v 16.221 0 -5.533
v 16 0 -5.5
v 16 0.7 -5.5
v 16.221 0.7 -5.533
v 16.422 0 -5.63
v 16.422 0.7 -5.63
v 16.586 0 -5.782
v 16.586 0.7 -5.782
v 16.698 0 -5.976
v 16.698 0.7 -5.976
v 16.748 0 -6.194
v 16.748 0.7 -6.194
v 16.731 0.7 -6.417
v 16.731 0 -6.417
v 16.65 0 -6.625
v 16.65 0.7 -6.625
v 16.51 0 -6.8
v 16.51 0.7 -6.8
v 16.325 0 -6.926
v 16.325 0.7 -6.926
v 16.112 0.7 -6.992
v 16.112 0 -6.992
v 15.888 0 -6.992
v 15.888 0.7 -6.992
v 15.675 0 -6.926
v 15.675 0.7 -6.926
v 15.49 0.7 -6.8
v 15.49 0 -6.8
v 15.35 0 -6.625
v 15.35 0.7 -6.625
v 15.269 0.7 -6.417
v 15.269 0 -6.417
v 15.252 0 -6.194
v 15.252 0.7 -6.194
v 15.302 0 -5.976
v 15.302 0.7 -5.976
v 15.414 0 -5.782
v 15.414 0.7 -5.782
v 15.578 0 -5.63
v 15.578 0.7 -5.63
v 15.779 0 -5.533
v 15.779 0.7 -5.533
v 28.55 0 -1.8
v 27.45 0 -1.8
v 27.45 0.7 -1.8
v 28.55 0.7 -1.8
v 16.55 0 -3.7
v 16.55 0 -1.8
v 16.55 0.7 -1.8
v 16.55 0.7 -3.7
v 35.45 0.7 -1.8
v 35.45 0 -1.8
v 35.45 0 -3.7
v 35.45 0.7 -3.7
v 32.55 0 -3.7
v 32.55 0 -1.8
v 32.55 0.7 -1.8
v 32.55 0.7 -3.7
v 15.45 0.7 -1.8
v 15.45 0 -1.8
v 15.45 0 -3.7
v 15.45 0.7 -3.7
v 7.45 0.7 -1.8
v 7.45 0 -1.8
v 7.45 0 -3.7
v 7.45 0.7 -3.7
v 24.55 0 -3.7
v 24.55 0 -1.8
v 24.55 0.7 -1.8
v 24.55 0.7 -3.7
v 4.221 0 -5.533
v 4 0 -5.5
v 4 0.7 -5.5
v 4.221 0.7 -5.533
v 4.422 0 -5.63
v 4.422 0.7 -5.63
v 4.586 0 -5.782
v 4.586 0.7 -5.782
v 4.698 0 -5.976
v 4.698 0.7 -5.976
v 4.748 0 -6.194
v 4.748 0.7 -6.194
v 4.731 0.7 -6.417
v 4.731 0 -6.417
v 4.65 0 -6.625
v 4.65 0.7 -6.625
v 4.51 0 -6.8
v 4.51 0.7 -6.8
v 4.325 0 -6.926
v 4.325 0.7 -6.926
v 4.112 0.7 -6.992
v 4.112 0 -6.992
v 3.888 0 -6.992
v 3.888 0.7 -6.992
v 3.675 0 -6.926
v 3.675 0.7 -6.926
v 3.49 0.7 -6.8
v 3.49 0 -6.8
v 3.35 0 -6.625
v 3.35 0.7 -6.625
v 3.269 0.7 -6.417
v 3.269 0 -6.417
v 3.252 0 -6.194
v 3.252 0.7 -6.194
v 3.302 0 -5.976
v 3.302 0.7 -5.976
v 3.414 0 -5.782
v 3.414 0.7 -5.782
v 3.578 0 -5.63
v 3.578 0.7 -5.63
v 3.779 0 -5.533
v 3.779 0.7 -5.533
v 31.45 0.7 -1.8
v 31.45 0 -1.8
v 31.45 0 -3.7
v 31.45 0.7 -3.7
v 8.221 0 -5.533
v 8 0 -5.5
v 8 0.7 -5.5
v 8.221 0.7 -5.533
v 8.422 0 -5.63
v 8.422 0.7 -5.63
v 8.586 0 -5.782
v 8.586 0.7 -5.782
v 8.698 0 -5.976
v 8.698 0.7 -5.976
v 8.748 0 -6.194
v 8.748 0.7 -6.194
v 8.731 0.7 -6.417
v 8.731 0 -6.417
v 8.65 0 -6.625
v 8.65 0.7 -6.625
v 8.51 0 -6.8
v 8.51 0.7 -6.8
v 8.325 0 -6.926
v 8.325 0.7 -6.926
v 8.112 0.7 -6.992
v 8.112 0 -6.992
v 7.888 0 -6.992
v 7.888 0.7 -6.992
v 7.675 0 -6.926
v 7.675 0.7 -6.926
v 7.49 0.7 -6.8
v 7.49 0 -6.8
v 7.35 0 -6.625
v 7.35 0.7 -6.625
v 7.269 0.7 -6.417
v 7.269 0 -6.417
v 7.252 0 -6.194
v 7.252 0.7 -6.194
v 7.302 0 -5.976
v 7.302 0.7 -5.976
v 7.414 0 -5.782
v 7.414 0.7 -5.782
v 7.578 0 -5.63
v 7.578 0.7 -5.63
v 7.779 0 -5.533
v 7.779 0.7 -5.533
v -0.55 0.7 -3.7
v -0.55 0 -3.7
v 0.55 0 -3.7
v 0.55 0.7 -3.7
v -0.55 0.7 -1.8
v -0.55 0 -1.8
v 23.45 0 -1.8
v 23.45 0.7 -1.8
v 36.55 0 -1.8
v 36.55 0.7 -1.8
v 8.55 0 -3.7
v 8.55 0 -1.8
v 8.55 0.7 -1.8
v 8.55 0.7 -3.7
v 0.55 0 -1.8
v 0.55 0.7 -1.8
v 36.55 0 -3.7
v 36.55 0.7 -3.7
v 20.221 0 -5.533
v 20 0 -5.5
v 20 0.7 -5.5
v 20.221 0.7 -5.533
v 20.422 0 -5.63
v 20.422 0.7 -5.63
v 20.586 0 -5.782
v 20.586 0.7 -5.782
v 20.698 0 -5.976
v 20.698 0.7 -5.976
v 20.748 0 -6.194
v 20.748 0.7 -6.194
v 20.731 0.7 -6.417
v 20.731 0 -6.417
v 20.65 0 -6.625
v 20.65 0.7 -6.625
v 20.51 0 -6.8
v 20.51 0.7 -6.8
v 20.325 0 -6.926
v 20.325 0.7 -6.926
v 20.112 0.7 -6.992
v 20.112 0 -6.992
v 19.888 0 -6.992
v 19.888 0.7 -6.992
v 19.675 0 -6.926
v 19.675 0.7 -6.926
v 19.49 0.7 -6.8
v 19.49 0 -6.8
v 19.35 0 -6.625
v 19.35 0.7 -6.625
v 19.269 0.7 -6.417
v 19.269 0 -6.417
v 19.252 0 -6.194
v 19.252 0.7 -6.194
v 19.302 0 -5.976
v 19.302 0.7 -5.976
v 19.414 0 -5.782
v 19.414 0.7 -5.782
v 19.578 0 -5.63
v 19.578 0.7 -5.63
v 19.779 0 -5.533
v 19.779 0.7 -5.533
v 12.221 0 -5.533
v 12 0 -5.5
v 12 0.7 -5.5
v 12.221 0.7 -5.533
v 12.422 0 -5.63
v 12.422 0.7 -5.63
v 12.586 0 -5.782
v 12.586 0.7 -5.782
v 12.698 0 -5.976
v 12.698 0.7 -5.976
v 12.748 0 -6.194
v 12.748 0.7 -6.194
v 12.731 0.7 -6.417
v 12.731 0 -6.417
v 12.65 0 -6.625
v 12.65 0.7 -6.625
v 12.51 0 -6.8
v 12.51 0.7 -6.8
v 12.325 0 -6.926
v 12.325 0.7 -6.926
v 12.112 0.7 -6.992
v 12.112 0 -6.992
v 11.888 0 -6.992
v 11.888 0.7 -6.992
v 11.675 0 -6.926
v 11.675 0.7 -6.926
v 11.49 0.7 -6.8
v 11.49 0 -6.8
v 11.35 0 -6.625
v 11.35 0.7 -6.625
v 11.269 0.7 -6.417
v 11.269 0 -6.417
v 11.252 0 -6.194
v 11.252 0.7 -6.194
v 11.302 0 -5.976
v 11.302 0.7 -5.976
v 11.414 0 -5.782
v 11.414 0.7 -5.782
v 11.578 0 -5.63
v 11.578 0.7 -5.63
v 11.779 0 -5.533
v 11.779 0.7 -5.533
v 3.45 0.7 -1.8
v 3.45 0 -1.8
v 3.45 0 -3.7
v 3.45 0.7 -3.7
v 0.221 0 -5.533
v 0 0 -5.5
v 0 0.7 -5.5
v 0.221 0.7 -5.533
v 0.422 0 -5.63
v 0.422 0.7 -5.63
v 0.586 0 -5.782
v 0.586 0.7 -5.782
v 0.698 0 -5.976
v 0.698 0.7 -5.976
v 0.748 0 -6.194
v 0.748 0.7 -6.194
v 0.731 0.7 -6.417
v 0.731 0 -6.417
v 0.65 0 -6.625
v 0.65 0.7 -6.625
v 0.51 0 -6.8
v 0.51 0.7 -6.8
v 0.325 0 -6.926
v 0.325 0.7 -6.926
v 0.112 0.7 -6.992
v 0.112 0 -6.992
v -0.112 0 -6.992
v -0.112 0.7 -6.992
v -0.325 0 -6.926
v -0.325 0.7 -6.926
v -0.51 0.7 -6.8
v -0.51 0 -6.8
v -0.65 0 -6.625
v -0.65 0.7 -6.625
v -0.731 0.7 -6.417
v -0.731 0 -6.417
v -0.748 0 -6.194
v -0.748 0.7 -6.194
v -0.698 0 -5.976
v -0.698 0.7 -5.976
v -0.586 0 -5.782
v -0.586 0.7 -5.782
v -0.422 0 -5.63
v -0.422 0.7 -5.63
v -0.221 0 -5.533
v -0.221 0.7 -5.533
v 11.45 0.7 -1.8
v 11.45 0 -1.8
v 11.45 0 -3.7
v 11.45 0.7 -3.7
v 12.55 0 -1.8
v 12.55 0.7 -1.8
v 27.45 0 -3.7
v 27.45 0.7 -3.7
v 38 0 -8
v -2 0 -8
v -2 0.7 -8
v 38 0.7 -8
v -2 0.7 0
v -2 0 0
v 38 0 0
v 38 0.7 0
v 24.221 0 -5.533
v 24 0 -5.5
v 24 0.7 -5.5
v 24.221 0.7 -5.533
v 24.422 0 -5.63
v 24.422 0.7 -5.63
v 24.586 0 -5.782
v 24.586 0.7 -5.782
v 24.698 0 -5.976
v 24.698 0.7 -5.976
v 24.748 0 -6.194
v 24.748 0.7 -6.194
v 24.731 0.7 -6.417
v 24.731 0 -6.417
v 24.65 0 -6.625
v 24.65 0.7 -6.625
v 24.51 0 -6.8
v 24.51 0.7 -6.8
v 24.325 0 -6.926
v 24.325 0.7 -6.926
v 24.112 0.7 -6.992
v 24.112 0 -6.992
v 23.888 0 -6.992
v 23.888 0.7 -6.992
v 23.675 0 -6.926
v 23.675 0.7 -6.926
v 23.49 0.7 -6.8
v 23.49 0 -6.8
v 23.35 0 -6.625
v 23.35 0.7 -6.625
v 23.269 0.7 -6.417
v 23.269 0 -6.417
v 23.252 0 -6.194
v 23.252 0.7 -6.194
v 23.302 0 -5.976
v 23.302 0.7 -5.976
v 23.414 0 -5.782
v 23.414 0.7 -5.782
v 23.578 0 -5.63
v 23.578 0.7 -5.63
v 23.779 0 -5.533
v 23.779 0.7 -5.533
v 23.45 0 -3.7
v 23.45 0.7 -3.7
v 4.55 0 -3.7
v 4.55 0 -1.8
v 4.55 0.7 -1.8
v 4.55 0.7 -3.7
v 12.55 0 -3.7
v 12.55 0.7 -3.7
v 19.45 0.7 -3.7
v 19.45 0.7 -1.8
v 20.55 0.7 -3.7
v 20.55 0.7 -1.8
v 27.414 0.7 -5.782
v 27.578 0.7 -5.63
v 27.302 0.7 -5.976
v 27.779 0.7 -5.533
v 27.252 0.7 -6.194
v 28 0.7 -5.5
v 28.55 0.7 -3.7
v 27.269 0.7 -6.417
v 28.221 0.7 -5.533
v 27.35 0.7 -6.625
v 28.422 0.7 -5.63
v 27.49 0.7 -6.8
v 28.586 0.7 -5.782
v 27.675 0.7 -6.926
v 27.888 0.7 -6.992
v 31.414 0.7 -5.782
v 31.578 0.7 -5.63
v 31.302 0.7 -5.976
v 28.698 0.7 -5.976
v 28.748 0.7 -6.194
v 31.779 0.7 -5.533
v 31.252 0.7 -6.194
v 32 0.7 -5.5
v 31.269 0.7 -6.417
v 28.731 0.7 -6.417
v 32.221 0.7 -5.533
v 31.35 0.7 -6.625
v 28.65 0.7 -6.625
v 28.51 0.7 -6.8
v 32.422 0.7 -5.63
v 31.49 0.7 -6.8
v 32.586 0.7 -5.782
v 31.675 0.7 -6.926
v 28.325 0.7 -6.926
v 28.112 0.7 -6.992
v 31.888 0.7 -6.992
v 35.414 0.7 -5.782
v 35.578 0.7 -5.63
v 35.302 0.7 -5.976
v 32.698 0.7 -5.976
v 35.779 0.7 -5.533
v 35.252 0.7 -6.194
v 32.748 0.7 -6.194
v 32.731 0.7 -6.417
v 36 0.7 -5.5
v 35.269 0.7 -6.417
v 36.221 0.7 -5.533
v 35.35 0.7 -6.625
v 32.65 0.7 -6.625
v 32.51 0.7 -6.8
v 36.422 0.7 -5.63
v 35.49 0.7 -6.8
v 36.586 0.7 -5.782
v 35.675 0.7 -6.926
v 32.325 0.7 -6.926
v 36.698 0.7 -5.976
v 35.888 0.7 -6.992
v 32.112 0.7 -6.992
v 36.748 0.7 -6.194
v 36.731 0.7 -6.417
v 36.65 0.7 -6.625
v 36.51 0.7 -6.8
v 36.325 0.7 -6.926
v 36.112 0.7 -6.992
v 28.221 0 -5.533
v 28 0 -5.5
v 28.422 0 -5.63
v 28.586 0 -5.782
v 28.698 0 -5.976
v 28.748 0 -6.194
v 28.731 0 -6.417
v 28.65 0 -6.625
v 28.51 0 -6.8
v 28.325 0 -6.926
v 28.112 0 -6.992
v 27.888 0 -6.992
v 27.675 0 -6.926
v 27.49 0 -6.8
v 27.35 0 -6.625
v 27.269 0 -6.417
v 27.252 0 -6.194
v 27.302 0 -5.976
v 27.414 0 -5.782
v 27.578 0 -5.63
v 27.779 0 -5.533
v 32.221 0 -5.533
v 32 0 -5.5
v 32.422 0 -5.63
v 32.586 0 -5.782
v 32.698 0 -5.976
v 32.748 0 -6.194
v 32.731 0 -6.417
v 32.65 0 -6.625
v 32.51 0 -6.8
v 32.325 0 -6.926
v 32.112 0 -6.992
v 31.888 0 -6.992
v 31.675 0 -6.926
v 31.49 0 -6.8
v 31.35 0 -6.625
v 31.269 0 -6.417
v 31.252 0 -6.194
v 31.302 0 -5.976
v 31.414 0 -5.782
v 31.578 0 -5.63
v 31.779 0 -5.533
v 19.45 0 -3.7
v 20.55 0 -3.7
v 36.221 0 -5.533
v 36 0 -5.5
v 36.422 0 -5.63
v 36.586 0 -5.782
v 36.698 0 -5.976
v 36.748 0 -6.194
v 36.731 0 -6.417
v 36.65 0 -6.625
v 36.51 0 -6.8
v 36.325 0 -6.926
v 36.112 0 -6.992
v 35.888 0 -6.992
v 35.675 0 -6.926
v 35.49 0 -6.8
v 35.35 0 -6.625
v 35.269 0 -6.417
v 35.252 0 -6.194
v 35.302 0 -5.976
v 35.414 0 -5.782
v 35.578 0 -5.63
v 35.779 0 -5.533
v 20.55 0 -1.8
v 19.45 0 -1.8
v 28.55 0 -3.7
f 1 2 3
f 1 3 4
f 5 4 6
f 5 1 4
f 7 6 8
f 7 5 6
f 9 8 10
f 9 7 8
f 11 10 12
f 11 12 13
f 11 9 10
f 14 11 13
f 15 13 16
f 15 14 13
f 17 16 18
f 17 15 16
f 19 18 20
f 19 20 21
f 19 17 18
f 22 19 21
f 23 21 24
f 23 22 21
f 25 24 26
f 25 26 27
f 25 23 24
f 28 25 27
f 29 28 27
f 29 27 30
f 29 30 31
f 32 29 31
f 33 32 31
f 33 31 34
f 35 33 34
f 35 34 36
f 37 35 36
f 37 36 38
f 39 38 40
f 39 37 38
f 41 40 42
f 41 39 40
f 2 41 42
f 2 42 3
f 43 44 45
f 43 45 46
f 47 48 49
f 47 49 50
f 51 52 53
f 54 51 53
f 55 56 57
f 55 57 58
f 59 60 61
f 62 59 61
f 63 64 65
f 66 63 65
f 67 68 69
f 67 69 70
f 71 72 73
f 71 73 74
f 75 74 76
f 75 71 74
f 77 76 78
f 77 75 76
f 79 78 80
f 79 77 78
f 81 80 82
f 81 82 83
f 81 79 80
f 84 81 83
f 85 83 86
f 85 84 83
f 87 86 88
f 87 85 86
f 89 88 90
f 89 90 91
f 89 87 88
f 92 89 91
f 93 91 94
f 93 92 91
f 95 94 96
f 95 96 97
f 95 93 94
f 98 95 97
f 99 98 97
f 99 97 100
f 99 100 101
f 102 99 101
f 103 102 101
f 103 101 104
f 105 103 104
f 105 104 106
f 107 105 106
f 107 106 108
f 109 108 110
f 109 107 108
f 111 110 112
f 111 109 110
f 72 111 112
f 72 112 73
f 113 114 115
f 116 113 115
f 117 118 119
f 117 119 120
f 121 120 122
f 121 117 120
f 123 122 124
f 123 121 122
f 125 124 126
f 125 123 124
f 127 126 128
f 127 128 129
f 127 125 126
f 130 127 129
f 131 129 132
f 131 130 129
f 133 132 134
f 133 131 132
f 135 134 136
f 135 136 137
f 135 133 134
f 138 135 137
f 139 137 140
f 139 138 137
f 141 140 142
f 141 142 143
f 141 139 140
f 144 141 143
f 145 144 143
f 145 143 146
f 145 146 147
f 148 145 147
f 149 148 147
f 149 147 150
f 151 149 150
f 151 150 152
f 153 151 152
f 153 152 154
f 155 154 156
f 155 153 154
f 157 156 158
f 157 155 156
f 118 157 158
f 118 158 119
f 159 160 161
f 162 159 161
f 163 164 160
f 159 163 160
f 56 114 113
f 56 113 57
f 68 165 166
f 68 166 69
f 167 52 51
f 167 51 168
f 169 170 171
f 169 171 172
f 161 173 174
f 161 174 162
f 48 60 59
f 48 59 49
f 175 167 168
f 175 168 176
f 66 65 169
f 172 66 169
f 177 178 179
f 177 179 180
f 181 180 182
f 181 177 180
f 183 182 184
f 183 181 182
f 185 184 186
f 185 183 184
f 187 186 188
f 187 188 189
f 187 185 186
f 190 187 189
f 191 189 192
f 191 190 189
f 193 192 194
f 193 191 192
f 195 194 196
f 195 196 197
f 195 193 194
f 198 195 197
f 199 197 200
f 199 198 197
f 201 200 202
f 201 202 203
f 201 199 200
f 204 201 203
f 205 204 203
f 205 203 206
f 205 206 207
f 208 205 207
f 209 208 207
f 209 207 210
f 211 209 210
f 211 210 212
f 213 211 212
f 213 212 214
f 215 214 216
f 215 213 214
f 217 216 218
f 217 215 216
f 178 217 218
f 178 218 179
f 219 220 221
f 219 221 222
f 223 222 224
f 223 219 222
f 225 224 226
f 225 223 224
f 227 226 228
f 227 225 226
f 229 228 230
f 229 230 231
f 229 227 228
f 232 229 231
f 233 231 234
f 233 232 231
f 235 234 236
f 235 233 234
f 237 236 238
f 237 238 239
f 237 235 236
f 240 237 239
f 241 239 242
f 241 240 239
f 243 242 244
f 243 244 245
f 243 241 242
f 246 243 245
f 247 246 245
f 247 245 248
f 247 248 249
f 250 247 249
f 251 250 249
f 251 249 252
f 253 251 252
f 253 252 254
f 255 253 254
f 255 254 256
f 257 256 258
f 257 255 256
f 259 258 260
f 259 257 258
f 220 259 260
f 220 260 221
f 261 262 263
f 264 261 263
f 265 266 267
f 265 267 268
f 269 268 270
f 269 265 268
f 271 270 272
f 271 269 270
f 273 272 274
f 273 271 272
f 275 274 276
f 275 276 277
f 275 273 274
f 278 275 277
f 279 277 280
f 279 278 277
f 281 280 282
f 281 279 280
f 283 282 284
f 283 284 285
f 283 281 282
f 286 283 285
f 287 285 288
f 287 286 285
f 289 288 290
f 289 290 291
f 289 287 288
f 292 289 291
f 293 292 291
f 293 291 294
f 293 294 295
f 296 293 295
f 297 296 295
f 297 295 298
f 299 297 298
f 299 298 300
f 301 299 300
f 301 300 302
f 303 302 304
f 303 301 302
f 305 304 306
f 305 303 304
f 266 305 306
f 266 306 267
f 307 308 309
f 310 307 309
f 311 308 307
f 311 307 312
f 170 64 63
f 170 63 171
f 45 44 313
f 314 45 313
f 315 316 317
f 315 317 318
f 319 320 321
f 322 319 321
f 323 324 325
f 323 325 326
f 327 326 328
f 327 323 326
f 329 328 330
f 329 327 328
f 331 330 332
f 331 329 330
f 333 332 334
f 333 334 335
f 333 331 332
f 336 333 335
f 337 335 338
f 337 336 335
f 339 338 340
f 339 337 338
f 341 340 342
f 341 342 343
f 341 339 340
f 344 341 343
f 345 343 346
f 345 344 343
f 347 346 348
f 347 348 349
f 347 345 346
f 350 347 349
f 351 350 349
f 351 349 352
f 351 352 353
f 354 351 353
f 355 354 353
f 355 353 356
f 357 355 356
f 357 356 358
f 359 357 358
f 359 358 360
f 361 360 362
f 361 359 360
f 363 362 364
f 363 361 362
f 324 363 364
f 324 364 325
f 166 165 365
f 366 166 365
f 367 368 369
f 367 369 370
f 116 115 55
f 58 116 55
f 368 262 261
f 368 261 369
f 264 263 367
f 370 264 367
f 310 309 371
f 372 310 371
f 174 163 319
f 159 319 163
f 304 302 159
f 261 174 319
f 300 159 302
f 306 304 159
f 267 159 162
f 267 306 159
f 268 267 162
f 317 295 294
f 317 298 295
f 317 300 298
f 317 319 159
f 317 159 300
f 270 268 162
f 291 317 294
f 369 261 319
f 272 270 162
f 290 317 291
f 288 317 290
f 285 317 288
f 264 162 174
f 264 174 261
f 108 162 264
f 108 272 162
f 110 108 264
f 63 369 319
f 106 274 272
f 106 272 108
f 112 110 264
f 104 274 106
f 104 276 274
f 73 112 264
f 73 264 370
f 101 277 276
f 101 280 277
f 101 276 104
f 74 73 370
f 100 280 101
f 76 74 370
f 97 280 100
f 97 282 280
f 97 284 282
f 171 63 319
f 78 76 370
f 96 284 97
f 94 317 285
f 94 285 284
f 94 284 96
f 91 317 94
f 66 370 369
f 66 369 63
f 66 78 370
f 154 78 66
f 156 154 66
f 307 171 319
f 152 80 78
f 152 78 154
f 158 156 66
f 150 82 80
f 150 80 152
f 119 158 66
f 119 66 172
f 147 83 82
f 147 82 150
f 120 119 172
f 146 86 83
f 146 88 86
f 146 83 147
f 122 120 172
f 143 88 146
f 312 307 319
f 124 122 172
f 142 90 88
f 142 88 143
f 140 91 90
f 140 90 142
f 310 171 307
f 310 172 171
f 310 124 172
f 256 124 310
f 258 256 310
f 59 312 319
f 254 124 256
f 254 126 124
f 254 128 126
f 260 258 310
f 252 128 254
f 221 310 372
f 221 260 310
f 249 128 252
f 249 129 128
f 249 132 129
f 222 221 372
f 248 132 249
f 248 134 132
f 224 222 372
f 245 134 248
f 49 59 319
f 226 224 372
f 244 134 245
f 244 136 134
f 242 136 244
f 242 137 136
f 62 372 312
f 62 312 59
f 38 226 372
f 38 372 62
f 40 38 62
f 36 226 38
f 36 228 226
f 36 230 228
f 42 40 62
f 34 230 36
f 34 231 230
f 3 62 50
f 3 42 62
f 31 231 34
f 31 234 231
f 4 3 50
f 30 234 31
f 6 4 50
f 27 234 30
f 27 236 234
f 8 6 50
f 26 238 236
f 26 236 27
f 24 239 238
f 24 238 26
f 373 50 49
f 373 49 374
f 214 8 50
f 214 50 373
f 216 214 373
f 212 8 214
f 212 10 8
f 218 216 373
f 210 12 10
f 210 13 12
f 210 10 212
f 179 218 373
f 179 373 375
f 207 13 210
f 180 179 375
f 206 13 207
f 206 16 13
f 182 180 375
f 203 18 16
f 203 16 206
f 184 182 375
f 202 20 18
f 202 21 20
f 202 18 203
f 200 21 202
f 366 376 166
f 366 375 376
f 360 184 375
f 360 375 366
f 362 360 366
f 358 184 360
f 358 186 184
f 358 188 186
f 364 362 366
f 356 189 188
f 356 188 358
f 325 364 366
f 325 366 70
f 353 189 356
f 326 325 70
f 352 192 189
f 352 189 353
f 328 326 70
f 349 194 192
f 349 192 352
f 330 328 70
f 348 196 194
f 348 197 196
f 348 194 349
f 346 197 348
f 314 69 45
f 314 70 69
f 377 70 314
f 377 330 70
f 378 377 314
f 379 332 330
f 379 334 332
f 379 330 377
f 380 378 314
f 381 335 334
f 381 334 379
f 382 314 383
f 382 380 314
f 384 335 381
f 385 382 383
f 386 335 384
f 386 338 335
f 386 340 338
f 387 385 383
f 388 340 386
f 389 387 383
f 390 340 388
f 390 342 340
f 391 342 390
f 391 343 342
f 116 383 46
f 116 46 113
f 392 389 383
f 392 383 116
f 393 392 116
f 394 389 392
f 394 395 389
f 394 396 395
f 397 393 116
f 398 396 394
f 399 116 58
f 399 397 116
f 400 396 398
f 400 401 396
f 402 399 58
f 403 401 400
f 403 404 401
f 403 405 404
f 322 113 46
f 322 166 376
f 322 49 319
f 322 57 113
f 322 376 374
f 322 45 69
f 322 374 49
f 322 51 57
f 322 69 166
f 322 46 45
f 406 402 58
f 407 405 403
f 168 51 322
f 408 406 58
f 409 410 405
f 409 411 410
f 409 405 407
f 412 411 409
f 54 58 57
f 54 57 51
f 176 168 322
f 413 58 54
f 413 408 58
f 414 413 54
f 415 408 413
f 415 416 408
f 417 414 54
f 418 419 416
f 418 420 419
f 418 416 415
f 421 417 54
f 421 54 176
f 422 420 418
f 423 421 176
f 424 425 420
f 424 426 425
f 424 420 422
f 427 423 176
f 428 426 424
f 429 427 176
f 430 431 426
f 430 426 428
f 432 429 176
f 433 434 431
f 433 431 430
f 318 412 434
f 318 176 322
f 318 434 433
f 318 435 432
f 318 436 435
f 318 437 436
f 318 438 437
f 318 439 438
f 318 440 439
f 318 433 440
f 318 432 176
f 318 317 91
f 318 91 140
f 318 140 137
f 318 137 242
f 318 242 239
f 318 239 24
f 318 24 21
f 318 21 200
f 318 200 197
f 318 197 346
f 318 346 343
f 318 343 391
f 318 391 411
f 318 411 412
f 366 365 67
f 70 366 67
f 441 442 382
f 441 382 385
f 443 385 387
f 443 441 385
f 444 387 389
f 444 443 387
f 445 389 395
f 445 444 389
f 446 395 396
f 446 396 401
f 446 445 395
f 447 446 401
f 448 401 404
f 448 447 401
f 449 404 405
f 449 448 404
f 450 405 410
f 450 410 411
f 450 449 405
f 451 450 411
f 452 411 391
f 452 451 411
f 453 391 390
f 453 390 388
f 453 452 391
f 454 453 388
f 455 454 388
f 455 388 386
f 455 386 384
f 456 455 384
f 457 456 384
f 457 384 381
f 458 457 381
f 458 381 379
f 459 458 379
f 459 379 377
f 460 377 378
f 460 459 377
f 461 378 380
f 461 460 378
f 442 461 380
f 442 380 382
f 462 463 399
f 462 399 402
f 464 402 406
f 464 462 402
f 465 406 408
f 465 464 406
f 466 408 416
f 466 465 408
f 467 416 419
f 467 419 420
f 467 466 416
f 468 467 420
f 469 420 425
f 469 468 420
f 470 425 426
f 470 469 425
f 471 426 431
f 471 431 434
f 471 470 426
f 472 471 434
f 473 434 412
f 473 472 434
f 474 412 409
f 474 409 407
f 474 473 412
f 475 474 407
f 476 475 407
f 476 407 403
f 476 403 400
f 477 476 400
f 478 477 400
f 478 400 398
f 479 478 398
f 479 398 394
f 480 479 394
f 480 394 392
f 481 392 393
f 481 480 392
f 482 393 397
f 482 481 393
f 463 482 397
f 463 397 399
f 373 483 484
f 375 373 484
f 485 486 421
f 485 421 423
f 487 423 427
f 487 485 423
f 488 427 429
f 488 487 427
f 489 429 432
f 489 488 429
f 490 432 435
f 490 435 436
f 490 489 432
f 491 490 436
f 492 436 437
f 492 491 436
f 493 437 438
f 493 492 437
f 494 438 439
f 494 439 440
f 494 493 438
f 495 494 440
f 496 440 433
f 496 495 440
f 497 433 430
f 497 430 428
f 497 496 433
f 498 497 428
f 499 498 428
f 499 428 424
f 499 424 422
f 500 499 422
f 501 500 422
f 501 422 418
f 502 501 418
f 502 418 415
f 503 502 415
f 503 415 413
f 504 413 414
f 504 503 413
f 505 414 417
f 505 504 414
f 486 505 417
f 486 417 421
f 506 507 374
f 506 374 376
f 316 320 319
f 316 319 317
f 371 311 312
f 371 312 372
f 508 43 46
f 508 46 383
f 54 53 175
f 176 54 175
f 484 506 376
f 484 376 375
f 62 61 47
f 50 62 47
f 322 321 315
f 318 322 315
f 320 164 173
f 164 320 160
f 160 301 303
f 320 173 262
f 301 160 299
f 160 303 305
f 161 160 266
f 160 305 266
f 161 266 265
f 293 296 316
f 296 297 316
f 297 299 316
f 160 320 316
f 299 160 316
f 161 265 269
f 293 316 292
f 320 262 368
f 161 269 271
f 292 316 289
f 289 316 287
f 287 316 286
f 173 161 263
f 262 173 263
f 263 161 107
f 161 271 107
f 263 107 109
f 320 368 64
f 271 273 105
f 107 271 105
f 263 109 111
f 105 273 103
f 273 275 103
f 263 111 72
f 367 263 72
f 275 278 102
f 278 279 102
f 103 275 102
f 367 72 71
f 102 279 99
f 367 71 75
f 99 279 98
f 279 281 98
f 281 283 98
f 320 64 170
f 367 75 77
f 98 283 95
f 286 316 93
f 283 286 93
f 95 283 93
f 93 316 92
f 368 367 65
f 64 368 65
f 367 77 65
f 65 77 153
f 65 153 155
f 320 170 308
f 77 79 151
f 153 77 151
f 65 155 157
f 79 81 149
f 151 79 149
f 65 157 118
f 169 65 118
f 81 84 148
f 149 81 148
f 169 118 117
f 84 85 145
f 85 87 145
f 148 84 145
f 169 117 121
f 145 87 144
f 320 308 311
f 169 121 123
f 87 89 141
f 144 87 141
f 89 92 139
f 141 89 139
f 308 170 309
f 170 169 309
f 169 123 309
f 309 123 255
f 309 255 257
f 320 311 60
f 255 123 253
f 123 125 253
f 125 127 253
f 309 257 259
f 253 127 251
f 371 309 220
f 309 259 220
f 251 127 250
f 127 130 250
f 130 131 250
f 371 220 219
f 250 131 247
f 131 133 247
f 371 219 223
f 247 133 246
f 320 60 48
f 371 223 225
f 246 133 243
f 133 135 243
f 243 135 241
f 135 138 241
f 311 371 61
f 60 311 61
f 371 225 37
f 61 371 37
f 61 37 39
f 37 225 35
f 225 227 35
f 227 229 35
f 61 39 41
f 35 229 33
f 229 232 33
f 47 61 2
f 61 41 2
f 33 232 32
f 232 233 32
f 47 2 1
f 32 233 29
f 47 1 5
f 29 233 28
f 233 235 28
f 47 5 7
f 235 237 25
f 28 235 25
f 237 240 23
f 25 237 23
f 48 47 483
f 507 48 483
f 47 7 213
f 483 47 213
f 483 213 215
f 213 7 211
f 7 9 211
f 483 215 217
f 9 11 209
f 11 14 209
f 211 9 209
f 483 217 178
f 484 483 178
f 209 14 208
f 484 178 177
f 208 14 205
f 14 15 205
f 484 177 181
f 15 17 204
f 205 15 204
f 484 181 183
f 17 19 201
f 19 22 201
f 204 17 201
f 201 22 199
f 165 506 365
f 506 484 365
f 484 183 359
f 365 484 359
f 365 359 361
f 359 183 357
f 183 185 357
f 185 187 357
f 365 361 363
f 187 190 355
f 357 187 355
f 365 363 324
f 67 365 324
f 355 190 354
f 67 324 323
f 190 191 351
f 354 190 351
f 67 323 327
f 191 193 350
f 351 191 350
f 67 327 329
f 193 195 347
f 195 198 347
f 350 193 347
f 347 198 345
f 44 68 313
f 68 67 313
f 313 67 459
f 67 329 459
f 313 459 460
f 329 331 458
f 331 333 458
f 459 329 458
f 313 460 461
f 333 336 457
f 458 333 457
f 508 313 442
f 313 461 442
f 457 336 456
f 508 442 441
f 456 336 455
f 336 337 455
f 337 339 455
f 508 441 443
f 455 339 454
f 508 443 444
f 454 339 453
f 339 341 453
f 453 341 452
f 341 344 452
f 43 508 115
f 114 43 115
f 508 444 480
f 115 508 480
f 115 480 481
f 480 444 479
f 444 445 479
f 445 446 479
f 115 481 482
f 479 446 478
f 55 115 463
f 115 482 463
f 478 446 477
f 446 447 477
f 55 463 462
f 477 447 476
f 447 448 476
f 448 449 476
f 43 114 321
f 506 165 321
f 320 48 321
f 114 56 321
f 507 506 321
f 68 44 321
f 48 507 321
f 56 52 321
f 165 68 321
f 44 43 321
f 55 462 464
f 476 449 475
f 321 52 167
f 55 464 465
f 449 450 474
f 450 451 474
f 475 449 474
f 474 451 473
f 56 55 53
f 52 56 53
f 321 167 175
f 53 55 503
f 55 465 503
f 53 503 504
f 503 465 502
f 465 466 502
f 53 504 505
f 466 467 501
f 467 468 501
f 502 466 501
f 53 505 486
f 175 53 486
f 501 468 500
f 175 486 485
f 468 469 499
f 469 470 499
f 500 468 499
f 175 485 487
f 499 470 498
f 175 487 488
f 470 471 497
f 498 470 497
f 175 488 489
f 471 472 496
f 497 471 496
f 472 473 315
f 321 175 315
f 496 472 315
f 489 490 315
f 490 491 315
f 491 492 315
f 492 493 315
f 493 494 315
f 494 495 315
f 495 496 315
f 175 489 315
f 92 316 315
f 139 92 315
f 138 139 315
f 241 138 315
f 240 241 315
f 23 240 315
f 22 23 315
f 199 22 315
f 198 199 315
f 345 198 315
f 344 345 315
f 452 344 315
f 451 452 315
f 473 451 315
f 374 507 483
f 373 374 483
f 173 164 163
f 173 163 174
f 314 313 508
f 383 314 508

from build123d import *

# Parameters (mm, degrees)
SKETCH_1_W             = 4
SKETCH_1_H             = 8
SKETCH_1_R             = 0.75
SKETCH_1_W_2           = 1.1
SKETCH_1_H_2           = 1.9
EXTRUDE_1_DEPTH        = 0.7
PATTERN_LINEAR_2_COUNT = 10
PATTERN_LINEAR_2_PITCH = 4


with BuildPart() as part:
    # 草图1 → 凸台-拉伸1 (new body)
    with BuildSketch(Plane(origin=(0, 0, 0), x_dir=(1, 0, 0), z_dir=(0, 1, 0))):
        with Locations((0, 4)):
            Rectangle(SKETCH_1_W, SKETCH_1_H)
        with Locations(Location((0, 6.25, 0), (0, 0, 270))):
            Circle(SKETCH_1_R, mode=Mode.SUBTRACT)
        with Locations((0, 2.75)):
            Rectangle(SKETCH_1_W_2, SKETCH_1_H_2, mode=Mode.SUBTRACT)
    extrude_1 = extrude(amount=EXTRUDE_1_DEPTH)

    # 阵列(线性)2: 凸台-拉伸1 ×10
    with Locations(*[(i * PATTERN_LINEAR_2_PITCH, 0, 0) for i in range(1, PATTERN_LINEAR_2_COUNT)]):
        add(extrude_1)


solid = part.part
